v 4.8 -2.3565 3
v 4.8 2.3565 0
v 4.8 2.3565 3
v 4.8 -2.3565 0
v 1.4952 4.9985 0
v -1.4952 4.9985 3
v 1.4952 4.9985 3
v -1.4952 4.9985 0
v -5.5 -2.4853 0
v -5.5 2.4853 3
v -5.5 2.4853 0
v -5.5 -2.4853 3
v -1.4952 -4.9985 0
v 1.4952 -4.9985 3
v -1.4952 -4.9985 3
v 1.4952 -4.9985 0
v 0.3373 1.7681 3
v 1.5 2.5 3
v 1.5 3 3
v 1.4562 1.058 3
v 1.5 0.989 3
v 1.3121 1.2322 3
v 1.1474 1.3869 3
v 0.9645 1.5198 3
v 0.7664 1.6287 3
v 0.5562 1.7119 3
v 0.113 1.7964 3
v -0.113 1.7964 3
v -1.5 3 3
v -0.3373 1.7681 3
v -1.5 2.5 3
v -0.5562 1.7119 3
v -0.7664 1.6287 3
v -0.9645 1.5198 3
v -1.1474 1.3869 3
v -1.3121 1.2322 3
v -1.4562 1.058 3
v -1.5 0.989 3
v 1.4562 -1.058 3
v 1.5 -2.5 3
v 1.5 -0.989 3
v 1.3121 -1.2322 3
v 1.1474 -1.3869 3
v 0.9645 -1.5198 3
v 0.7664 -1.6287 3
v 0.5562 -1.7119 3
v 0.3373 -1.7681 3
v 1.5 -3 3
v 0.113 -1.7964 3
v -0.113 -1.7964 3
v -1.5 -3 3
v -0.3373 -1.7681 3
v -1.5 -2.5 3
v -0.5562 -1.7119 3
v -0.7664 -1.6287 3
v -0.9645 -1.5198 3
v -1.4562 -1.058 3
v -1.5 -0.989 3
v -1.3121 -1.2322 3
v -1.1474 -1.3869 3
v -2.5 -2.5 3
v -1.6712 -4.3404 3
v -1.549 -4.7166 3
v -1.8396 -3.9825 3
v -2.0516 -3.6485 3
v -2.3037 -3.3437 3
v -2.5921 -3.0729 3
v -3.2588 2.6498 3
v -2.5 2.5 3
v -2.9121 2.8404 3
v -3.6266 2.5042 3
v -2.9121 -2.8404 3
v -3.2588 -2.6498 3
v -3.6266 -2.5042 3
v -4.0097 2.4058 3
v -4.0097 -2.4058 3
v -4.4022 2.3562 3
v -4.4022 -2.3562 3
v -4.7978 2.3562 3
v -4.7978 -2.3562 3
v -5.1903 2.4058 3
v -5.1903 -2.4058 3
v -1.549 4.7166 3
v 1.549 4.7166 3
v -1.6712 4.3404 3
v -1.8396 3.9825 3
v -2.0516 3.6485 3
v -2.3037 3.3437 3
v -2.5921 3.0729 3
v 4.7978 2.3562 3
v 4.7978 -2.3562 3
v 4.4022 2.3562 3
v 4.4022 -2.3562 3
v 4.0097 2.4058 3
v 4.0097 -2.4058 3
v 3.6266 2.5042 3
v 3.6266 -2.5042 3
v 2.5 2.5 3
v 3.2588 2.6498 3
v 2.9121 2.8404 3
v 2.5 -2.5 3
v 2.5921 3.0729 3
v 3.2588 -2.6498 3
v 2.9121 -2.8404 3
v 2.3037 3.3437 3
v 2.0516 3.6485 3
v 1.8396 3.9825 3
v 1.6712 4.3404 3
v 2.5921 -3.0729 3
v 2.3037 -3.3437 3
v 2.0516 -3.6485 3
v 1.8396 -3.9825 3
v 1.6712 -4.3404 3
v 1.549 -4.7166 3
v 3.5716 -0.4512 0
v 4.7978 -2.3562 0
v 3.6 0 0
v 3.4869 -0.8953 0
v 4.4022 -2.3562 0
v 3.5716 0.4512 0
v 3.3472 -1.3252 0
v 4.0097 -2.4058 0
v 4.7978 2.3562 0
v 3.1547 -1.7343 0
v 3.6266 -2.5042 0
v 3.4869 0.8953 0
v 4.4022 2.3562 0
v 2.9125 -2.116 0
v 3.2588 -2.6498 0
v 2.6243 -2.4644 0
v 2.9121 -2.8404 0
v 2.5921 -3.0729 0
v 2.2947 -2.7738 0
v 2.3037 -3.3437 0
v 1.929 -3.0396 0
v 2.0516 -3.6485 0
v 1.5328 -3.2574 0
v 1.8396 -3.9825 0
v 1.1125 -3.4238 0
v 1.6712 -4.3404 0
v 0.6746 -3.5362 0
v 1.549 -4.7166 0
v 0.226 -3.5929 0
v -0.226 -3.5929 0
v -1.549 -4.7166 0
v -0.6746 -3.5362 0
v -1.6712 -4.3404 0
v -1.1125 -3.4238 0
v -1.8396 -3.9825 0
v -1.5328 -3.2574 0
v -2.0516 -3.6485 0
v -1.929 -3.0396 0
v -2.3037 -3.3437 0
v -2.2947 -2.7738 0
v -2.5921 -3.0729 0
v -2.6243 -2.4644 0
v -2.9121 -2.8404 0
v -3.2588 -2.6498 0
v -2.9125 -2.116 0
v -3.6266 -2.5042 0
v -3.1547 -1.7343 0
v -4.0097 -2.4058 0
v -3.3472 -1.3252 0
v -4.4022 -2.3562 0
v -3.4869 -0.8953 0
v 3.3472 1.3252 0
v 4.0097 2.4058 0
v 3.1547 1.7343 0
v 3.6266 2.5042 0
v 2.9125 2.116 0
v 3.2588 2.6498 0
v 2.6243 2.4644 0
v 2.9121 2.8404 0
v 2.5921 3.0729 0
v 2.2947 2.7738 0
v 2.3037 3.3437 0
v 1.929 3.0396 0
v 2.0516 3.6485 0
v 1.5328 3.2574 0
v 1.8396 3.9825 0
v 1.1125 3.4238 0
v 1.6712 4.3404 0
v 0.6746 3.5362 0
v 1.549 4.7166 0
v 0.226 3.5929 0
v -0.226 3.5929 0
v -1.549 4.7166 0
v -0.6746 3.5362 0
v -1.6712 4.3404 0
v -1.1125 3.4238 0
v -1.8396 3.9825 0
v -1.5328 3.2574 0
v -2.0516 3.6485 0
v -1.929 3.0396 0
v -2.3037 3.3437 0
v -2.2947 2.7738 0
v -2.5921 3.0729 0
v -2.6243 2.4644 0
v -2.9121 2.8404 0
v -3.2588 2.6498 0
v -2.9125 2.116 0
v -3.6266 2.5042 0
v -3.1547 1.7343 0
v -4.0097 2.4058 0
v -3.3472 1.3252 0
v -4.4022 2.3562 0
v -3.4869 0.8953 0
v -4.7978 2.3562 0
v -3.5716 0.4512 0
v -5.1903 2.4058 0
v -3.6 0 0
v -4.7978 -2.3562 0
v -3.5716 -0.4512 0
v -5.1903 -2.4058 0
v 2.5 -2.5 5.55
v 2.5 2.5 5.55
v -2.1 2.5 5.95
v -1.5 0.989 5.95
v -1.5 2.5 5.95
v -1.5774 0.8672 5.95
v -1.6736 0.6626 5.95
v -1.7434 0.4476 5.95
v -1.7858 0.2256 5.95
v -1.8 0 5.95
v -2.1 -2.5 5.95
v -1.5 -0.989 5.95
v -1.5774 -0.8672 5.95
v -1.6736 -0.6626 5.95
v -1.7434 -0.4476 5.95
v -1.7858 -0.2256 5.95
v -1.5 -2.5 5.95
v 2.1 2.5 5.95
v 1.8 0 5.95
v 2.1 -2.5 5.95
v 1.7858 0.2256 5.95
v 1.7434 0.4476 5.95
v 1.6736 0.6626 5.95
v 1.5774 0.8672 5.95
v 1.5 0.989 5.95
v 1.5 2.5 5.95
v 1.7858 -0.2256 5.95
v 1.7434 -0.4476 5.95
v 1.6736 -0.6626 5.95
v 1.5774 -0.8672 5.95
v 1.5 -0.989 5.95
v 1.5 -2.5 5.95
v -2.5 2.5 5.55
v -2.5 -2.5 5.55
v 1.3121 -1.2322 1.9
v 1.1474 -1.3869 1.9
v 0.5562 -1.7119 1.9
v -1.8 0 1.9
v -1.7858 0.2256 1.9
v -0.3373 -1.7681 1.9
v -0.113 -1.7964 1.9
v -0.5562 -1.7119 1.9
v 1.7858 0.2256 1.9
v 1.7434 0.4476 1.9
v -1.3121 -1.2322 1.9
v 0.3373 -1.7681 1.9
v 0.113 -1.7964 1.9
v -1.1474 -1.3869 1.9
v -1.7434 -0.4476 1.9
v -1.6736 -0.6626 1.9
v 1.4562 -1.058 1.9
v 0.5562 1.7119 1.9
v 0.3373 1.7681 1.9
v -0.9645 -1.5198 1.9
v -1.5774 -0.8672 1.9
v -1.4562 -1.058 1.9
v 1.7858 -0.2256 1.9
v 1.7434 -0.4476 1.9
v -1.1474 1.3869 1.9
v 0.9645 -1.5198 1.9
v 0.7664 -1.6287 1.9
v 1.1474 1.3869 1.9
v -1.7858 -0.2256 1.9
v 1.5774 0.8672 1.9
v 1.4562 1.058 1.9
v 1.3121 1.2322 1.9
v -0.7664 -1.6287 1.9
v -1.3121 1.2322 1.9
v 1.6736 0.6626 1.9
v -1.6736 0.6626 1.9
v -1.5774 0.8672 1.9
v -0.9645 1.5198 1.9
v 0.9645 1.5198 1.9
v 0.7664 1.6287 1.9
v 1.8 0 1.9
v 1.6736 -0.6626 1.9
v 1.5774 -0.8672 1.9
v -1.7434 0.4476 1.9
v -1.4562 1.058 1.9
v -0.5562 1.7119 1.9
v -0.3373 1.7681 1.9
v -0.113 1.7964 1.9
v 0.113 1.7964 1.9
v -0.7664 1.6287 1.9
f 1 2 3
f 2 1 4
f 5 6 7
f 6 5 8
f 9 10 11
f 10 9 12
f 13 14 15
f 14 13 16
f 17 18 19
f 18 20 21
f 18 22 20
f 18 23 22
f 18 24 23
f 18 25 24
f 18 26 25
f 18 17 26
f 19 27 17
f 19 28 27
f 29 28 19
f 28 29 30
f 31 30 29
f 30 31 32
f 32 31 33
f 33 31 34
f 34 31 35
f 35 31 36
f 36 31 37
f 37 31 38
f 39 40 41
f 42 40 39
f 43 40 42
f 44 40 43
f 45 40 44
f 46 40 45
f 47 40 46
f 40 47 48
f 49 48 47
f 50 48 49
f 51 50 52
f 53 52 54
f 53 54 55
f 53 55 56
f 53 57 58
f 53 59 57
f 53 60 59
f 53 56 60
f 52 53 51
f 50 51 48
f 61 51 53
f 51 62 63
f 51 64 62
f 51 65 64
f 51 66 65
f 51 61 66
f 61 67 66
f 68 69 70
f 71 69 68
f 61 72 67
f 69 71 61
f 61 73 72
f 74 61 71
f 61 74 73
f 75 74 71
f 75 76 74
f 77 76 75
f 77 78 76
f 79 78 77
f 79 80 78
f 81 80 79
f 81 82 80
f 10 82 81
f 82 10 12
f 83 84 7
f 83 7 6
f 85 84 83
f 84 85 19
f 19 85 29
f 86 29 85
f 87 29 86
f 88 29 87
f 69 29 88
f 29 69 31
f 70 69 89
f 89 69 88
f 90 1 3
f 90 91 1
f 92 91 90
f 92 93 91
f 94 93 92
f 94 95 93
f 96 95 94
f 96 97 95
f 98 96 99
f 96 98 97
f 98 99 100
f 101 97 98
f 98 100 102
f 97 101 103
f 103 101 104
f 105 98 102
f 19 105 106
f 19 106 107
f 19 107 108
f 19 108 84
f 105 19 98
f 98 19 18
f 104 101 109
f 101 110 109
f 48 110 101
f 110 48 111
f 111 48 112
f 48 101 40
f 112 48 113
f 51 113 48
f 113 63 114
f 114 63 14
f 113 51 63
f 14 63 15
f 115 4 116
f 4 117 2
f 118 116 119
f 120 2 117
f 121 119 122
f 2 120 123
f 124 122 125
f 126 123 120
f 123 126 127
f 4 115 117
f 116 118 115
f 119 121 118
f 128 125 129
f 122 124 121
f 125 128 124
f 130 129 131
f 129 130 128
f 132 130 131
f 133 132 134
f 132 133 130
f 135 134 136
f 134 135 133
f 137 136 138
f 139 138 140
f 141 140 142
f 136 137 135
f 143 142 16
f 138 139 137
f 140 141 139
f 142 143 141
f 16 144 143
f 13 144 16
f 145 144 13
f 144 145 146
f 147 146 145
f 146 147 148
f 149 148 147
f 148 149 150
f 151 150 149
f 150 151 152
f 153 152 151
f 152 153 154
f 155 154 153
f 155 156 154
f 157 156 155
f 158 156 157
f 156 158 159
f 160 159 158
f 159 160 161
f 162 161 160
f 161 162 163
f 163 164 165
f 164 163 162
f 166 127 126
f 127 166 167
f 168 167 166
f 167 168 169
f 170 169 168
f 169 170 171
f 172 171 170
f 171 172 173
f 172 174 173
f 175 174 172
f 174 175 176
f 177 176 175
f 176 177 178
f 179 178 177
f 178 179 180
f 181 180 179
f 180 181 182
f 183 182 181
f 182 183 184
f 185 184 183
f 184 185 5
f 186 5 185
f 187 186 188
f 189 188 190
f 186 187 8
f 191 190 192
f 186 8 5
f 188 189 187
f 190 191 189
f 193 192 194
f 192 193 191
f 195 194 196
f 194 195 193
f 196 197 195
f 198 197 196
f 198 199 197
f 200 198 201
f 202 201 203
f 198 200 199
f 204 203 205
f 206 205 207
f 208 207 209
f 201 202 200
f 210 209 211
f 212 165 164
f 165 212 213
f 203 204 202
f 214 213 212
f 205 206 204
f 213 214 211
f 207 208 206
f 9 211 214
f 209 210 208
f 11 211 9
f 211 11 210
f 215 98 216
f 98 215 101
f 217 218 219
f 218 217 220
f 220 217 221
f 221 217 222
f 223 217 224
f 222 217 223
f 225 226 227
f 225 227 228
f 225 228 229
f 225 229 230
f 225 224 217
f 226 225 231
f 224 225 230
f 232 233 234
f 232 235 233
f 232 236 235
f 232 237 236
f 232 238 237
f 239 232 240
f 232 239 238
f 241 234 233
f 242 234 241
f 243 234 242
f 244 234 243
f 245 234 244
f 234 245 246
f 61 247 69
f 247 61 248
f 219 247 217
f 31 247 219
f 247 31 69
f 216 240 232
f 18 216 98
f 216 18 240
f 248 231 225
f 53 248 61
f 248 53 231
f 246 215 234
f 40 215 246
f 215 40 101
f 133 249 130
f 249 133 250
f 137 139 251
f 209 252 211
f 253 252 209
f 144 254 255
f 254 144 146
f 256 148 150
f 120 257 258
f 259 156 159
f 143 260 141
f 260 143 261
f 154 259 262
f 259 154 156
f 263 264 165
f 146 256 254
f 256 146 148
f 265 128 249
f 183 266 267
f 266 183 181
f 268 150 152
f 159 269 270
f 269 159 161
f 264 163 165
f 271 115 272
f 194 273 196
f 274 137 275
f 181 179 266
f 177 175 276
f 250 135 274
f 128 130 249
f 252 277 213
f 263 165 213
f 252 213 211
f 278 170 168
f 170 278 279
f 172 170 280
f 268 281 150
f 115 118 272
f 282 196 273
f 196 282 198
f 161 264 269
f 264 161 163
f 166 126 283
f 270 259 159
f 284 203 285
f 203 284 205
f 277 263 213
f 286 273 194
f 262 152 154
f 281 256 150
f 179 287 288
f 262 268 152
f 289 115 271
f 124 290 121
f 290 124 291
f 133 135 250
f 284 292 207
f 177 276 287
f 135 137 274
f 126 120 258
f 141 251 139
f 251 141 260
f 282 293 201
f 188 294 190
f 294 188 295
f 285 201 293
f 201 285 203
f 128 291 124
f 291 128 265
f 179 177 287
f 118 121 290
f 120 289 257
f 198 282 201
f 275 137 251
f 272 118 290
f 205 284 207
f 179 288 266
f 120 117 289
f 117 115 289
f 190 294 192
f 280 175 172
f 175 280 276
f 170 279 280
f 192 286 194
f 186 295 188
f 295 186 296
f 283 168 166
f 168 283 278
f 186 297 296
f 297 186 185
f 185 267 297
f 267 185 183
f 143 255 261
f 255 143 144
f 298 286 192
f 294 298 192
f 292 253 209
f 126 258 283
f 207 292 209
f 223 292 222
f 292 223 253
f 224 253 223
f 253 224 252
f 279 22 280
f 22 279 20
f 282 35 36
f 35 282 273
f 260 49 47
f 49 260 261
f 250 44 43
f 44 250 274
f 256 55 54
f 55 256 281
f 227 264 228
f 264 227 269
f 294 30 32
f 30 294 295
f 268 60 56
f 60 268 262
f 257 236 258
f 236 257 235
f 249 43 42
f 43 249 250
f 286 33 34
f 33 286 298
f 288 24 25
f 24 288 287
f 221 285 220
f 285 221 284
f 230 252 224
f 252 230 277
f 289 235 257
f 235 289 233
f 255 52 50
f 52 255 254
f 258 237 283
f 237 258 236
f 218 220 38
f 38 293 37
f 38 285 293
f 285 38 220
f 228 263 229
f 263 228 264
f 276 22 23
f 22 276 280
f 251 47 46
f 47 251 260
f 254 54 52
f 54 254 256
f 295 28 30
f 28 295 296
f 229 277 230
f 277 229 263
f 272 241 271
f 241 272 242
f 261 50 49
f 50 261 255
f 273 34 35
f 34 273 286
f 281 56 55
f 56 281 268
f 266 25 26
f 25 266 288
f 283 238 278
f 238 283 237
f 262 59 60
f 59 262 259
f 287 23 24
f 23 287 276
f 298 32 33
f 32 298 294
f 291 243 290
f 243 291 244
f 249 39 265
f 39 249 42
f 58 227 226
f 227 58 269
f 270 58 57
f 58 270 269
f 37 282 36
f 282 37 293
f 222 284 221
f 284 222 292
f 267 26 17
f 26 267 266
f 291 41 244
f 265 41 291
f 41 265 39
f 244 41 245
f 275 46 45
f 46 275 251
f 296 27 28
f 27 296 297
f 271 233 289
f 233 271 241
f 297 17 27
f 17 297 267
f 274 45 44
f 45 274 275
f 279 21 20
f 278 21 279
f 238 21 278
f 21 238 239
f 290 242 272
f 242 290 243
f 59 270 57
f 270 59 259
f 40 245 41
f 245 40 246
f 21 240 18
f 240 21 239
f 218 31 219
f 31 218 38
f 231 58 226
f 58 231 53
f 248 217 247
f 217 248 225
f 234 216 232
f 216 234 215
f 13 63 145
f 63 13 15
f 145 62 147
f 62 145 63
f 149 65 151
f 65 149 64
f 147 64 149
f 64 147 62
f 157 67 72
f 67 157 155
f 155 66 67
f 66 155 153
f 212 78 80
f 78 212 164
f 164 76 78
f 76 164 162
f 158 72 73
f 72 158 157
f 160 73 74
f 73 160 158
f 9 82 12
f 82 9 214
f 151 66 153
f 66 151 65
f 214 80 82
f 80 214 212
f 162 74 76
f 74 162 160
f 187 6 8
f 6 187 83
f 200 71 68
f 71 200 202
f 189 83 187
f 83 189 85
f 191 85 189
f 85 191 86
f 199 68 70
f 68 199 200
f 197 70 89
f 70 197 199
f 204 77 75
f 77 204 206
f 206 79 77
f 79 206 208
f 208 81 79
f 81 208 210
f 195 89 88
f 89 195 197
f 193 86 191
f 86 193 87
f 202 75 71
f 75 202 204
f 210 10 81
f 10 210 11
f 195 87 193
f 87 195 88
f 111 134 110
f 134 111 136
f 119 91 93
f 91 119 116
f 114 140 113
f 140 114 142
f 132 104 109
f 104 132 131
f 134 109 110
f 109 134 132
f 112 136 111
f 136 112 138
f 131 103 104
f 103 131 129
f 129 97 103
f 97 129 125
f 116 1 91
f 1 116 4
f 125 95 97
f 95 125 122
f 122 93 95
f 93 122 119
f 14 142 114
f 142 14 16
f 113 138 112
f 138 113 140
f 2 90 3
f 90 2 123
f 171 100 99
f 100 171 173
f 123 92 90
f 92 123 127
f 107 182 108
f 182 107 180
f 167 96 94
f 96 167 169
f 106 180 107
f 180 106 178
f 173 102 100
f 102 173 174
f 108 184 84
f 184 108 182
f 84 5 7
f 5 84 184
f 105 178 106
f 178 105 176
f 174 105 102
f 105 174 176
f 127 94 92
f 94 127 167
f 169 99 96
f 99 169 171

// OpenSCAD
$fn = 50;

difference() {
	union() {
		translate(v = [0, 0, 0]) {
			rotate(a = [0, 0, 0]) {
				difference() {
					union() {
						translate(v = [-0.35, 0, 0]) {
							hull() {
								translate(v = [-4.4, 4.25, 0]) {
									cylinder(h = 3.0, r = 0.75);
								}
								translate(v = [4.4, 4.25, 0]) {
									cylinder(h = 3.0, r = 0.75);
								}
								translate(v = [-4.4, -4.25, 0]) {
									cylinder(h = 3.0, r = 0.75);
								}
								translate(v = [4.4, -4.25, 0]) {
									cylinder(h = 3.0, r = 0.75);
								}
							}
						}
						translate(v = [-2.5, -2.5, 2.95]) {
							cube(size = [5.0, 5.0, 3.0]);
						}
					}
					union() {
						translate(v = [0, 0, 0]) {
							rotate(a = [0, 180, 0]) {
								difference() {
									union() {
										translate(v = [0, 0, -20.0]) {
											cylinder(h = 20.0, r = 1.5);
										}
										translate(v = [0, 0, -1.9]) {
											cylinder(h = 1.9, r1 = 1.8, r2 = 3.6);
										}
										cylinder(h = 250, r = 3.6);
										translate(v = [0, 0, -20.0]) {
											cylinder(h = 20.0, r = 1.8);
										}
										translate(v = [0, 0, -20.0]) {
											cylinder(h = 20.0, r = 1.5);
										}
									}
									union();
								}
							}
						}
						translate(v = [-1.5, -3.0, 3.0]) {
							cube(size = [3.0, 6.0, 3.0500000000000003]);
						}
						translate(v = [0, 2.6, 0]) {
							rotate(a = [90, 0, 0]) {
								linear_extrude(height = 5.2) {
									polygon(points = [[-2.7, 5.3500000000000005], [-1.9, 6.15], [-2.7, 6.15]]);
								}
							}
						}
						translate(v = [0, 2.6, 0]) {
							rotate(a = [90, 0, 0]) {
								linear_extrude(height = 5.2) {
									polygon(points = [[2.7, 5.3500000000000005], [1.9, 6.15], [2.7, 6.15]]);
								}
							}
						}
						translate(v = [-4.6, -5.5, -0.1]) {
							cylinder(h = 3.2, r = 3.15);
						}
						translate(v = [-4.6, 5.5, -0.1]) {
							cylinder(h = 3.2, r = 3.15);
						}
						translate(v = [4.6, -5.5, -0.1]) {
							cylinder(h = 3.2, r = 3.15);
						}
						translate(v = [4.6, 5.5, -0.1]) {
							cylinder(h = 3.2, r = 3.15);
						}
					}
				}
			}
		}
	}
	union();
}
